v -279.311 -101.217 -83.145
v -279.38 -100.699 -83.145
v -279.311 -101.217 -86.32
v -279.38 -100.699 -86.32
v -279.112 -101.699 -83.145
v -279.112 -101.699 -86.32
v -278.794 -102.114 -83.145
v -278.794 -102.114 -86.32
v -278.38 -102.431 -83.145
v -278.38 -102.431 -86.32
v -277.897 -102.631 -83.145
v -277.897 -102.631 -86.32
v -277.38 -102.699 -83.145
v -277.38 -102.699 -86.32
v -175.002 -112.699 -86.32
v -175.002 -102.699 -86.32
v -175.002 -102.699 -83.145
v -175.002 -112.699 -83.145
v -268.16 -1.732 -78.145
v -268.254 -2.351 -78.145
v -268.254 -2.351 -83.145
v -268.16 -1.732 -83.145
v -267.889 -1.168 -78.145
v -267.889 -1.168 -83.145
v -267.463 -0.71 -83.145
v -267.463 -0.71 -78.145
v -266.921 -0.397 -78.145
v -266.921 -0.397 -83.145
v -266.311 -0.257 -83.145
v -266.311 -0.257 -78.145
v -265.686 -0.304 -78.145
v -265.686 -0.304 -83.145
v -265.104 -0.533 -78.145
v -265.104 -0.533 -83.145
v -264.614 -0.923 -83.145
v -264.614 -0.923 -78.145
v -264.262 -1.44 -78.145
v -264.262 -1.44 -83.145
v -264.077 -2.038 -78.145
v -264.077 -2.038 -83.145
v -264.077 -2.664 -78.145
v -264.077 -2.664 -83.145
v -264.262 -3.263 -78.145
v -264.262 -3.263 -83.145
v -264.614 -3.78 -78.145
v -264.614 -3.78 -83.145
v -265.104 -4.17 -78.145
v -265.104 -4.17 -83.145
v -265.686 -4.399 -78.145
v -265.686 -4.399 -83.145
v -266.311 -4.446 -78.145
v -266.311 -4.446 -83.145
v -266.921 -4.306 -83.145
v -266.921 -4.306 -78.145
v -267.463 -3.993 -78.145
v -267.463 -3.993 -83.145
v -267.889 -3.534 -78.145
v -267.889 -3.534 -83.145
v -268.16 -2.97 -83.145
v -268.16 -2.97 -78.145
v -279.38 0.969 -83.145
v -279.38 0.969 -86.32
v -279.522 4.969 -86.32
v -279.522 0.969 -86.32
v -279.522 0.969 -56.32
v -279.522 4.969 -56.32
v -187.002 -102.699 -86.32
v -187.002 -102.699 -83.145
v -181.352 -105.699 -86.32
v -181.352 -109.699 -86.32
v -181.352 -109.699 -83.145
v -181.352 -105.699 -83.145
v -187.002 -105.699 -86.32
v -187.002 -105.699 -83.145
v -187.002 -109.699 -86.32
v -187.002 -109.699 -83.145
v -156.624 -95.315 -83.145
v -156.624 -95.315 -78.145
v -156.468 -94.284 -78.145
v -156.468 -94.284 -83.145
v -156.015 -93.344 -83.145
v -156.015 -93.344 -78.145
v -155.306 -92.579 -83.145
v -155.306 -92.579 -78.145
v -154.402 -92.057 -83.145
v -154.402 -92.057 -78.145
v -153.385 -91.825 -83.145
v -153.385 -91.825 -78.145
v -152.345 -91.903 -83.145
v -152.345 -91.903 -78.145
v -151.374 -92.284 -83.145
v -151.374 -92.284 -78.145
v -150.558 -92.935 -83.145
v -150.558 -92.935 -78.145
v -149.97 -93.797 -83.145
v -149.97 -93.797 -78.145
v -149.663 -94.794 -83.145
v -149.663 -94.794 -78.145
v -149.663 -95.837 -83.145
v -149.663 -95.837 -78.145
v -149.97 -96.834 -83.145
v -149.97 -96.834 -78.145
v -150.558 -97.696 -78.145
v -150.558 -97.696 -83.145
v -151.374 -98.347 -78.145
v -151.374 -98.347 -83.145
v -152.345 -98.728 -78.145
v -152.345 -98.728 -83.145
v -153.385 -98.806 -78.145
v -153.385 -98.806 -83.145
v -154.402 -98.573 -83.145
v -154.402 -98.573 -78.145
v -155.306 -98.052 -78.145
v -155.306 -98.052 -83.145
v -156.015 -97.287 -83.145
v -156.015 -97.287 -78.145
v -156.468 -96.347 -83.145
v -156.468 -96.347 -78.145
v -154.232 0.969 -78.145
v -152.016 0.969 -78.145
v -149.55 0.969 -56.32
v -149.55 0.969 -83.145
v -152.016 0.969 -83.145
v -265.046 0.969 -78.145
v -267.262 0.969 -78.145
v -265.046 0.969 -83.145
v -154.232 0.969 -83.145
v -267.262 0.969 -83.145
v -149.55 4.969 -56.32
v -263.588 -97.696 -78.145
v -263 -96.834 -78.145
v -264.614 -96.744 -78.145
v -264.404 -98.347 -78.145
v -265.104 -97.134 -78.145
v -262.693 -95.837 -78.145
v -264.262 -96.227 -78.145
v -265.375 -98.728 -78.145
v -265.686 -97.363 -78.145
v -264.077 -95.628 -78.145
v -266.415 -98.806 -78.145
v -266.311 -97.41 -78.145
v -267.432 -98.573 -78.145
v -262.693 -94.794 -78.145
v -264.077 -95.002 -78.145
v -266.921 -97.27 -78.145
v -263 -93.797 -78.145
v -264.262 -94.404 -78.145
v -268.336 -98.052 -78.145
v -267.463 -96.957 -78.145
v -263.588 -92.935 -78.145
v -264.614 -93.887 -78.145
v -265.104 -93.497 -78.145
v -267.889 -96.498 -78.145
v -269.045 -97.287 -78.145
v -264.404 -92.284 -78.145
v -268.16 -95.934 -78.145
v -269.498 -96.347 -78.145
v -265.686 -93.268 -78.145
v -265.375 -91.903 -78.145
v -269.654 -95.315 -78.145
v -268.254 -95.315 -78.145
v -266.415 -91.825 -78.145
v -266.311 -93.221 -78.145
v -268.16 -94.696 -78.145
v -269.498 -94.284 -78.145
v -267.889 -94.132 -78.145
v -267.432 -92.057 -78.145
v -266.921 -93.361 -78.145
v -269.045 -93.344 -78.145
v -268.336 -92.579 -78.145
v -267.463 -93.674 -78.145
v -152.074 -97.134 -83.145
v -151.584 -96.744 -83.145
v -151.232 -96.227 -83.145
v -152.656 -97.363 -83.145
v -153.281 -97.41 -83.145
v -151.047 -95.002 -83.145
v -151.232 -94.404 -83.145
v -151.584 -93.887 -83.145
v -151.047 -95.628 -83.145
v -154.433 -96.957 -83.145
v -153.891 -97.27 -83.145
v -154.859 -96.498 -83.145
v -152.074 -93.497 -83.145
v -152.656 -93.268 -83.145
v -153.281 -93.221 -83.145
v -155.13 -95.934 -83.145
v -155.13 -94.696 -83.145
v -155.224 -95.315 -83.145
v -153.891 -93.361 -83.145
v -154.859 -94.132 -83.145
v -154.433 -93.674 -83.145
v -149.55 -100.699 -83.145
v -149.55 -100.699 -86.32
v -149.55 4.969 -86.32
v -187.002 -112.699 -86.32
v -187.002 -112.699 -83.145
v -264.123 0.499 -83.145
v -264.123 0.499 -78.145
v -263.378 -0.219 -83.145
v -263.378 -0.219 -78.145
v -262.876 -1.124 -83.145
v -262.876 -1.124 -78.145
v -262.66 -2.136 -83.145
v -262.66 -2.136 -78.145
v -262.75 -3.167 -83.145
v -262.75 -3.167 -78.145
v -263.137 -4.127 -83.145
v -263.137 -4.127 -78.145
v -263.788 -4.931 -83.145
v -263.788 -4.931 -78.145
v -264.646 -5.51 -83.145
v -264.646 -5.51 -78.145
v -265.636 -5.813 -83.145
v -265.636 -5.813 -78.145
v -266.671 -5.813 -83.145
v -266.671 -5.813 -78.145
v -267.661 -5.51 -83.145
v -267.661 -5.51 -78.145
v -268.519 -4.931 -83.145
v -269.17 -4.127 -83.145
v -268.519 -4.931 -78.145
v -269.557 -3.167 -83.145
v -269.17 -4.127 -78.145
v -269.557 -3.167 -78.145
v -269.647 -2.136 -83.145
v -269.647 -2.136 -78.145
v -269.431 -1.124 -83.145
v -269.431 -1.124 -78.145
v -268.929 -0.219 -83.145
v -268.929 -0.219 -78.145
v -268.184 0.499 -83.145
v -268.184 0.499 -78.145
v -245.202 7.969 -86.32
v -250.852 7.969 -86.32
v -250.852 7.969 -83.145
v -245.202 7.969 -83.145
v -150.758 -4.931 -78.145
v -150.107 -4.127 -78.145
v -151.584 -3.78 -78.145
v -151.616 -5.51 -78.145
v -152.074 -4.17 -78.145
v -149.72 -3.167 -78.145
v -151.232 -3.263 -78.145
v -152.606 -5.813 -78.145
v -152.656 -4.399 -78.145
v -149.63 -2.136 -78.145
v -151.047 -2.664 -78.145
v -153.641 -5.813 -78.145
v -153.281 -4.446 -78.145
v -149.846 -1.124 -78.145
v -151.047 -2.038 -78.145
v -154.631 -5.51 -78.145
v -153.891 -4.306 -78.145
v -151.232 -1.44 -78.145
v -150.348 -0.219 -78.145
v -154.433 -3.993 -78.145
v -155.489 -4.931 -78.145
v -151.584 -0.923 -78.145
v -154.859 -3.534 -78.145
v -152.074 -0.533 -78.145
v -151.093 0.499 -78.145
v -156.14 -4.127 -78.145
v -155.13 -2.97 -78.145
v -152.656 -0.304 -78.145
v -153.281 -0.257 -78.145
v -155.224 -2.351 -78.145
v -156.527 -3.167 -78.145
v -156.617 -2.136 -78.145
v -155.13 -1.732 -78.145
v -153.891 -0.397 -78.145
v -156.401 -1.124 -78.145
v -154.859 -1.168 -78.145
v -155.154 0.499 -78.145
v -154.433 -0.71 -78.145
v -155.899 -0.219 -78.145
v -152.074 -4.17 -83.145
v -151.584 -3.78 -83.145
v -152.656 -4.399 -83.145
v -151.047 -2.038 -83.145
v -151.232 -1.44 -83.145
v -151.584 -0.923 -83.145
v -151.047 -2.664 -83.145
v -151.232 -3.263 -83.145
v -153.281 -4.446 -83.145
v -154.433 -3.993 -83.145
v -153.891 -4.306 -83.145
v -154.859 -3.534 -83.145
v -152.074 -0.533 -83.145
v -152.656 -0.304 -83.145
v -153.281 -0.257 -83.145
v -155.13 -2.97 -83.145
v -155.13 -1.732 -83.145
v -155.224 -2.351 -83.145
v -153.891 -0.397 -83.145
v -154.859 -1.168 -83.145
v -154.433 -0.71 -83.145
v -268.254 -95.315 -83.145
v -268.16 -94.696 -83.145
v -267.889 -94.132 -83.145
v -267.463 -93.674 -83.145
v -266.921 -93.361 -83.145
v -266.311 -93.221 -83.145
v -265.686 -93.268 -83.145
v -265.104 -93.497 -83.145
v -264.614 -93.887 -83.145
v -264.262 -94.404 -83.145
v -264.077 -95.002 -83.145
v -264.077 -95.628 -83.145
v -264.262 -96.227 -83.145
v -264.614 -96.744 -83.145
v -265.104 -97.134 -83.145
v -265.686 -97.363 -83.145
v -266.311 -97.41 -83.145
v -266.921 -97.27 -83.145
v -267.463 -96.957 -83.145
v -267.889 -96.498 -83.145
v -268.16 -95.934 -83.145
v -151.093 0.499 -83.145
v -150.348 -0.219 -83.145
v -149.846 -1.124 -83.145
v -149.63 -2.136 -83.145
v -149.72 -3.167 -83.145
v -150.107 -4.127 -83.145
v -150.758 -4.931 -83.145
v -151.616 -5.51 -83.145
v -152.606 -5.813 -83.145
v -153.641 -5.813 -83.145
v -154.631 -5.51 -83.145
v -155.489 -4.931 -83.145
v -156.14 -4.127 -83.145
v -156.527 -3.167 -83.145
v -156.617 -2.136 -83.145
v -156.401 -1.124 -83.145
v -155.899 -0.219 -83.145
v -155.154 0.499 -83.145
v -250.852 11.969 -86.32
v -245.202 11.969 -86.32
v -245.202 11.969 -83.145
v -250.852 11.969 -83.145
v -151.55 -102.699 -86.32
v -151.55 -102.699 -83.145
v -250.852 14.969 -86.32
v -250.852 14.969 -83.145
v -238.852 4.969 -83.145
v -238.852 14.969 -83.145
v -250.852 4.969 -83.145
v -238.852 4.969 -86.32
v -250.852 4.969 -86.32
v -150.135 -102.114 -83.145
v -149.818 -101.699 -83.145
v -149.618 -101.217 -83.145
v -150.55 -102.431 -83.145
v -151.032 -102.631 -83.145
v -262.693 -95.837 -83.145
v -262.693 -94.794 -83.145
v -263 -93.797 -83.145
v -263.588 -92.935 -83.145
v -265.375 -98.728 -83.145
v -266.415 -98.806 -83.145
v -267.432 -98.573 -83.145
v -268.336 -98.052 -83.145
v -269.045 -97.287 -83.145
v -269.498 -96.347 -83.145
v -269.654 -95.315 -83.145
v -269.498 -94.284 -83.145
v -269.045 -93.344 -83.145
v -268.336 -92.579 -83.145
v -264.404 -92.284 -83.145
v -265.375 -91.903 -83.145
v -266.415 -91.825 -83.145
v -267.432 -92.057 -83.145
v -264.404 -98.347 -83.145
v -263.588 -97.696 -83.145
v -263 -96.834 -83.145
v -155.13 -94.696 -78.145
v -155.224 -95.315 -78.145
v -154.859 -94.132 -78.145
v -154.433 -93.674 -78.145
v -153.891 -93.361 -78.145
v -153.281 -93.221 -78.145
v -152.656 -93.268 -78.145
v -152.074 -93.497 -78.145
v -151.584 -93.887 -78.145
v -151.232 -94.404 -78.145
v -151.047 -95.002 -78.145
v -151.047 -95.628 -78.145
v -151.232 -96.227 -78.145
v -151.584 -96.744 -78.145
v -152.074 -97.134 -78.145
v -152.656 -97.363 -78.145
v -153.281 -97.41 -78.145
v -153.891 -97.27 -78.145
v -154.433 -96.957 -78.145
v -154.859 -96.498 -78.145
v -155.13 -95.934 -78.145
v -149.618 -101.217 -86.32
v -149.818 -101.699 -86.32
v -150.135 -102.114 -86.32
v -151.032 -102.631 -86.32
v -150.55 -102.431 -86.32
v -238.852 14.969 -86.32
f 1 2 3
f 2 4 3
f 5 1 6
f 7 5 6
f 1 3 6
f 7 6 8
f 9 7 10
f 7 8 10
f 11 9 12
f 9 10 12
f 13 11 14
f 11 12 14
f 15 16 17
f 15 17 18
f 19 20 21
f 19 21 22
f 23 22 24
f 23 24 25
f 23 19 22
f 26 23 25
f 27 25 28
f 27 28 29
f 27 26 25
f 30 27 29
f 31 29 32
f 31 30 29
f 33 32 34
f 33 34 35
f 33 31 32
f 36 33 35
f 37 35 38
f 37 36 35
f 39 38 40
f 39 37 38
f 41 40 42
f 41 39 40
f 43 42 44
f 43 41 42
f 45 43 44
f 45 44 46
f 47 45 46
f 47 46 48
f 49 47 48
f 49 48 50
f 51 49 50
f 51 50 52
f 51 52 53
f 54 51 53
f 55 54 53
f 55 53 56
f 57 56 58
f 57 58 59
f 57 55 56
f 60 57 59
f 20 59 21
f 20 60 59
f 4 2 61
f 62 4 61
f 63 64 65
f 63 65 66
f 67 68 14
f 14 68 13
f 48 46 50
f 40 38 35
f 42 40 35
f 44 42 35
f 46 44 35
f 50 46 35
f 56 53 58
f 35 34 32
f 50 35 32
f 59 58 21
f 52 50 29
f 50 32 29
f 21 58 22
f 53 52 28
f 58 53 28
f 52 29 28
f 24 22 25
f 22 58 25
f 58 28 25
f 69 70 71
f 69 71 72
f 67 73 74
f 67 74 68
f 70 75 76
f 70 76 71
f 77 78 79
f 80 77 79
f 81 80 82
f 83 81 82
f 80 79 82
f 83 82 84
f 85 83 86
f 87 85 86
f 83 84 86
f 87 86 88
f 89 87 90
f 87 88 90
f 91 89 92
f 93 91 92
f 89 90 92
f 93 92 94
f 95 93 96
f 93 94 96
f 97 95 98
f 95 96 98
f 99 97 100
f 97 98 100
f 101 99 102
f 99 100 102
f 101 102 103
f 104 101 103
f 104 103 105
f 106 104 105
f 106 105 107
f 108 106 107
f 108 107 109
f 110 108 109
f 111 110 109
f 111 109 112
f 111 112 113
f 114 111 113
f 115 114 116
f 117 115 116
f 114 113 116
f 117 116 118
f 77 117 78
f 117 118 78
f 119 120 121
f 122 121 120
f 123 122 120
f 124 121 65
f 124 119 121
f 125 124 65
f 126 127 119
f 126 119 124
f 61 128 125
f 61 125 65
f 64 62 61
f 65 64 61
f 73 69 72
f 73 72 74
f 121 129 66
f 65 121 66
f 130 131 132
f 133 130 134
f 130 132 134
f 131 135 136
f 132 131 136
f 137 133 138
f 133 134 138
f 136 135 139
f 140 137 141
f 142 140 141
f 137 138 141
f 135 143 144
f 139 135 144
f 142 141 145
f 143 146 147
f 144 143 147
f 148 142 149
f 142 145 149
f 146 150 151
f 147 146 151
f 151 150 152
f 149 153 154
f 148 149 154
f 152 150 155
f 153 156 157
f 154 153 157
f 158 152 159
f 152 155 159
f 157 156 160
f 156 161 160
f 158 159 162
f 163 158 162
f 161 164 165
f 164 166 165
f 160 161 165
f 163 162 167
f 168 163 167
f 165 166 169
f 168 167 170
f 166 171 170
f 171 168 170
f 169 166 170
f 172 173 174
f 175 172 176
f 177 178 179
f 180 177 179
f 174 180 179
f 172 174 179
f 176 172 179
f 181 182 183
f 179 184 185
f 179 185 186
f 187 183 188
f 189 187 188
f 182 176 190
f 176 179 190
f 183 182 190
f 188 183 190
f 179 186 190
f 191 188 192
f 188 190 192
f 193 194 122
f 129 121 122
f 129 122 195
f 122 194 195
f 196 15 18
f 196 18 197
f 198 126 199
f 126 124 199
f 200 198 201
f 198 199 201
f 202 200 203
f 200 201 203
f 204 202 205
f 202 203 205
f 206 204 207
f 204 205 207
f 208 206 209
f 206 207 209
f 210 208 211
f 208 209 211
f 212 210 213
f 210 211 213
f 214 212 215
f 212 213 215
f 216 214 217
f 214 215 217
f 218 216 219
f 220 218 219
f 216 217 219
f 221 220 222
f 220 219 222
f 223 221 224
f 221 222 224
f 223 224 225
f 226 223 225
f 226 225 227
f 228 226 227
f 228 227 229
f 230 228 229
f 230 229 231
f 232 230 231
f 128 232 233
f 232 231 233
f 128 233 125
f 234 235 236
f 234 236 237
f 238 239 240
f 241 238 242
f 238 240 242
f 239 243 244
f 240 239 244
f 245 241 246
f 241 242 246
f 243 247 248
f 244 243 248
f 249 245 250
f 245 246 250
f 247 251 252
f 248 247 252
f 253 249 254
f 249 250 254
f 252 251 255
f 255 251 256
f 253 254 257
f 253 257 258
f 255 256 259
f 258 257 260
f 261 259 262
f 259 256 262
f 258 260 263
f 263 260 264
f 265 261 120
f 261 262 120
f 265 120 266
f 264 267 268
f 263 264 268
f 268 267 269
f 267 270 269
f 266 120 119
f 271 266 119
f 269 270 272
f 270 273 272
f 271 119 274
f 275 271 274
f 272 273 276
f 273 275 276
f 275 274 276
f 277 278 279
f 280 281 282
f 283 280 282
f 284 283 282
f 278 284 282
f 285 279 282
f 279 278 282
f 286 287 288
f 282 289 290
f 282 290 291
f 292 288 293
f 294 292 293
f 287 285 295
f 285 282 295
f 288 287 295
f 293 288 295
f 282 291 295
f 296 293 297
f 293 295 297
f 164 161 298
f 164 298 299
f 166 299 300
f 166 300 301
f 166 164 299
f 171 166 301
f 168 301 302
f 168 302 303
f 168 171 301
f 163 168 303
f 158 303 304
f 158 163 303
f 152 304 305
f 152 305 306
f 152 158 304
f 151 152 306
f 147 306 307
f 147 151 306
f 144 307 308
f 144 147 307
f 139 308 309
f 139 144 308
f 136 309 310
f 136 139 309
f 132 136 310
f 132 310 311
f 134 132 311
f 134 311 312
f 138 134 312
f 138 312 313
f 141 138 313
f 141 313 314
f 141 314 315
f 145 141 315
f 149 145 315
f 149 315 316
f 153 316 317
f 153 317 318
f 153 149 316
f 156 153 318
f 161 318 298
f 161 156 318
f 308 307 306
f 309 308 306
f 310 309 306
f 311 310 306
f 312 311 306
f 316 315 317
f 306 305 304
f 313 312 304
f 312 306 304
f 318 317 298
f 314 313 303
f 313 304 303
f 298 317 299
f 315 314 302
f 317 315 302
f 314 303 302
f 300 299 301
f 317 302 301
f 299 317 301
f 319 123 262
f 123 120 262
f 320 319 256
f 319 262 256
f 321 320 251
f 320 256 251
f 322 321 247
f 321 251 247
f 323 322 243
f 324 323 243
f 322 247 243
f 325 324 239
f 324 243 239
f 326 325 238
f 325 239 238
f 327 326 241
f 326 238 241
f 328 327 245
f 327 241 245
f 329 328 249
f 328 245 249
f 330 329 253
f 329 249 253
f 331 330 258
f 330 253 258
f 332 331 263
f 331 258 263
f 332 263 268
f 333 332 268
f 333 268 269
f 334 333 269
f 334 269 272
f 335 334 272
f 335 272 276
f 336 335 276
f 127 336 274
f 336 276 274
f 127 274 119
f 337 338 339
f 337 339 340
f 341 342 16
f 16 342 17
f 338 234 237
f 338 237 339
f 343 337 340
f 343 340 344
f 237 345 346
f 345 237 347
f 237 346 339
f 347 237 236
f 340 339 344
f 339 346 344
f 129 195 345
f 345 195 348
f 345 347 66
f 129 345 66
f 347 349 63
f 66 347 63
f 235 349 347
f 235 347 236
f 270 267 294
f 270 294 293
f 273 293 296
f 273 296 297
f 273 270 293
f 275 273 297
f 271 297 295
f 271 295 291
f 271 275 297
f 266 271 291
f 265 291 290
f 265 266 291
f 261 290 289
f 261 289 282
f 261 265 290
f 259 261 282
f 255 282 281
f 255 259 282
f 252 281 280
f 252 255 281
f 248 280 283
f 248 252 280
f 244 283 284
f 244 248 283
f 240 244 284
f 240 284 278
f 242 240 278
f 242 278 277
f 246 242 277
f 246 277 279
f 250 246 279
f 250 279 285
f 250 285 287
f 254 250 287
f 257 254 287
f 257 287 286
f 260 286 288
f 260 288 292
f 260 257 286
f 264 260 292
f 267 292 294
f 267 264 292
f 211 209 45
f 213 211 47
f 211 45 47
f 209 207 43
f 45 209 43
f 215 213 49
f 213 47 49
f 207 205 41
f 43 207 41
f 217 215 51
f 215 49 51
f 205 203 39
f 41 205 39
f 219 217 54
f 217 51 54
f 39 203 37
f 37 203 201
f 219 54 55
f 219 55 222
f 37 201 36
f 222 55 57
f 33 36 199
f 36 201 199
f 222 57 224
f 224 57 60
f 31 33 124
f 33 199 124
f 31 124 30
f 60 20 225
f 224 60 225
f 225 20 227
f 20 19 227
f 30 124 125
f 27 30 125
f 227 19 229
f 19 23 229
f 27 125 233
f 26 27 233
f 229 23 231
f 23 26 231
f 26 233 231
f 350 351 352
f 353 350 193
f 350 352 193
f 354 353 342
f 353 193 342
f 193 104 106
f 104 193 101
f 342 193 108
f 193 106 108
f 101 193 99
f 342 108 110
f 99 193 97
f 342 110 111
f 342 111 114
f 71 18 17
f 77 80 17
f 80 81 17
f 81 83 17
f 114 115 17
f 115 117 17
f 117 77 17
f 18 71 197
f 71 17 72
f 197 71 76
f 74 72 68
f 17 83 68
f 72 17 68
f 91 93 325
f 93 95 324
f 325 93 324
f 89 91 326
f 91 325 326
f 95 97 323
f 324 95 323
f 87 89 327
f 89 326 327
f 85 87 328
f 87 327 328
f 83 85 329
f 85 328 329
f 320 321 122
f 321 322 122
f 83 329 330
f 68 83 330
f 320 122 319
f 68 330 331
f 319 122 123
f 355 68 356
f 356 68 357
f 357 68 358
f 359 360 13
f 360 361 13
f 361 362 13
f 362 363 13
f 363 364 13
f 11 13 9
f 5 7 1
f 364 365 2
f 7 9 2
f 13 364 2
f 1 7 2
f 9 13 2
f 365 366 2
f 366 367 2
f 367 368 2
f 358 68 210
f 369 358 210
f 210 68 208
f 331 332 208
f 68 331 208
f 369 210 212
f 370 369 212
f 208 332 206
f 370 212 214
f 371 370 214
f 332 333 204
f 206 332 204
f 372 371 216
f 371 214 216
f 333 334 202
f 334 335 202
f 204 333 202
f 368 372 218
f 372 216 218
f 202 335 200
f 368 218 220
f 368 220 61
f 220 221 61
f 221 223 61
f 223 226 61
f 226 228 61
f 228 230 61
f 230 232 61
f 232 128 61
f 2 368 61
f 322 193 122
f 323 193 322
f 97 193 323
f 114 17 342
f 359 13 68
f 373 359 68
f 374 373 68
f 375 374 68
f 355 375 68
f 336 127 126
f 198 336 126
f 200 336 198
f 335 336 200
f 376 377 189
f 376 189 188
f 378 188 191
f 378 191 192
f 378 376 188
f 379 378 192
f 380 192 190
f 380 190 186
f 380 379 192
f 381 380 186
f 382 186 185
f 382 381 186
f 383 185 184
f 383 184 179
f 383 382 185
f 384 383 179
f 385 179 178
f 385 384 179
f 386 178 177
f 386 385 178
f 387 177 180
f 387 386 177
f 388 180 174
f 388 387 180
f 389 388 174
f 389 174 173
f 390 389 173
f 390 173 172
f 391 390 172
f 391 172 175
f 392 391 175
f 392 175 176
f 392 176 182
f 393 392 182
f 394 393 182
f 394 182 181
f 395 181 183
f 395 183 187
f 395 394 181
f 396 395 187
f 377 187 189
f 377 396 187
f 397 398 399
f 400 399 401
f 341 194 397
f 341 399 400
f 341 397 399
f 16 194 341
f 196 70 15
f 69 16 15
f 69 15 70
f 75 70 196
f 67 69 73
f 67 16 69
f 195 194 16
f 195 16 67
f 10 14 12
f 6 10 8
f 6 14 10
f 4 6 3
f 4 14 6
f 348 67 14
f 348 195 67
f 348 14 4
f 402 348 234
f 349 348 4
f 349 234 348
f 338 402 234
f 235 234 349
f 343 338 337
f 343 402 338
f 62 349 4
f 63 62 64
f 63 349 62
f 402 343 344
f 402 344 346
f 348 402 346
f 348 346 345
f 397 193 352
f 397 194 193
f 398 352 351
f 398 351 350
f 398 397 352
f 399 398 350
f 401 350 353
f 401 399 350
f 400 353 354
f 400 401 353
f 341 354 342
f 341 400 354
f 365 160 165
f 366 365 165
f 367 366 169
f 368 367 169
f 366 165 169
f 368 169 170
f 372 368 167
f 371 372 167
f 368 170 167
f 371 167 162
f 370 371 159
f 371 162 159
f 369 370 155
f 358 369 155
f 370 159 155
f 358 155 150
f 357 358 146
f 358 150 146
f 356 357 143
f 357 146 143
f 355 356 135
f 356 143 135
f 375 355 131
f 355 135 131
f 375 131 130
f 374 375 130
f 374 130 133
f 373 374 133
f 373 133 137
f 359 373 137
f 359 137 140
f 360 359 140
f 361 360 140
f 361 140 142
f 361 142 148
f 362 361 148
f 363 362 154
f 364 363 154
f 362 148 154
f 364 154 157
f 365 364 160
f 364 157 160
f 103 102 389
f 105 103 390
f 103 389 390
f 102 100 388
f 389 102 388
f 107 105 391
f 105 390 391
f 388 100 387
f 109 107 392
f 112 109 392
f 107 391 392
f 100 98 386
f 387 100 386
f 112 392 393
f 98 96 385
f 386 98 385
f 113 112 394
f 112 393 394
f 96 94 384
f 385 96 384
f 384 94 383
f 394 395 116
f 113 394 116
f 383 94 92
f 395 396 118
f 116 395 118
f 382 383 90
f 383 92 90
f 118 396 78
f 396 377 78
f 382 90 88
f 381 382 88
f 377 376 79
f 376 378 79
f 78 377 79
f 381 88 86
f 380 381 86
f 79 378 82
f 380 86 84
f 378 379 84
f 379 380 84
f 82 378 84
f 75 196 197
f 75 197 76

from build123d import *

# Parameters (mm, degrees)
SKETCH1_R             = 3.5
SKETCH1_R_2           = 2.1
BOSS_EXTRUDE1_DEPTH   = 5
BOSS_EXTRUDE1_2_DEPTH = 5
BOSS_EXTRUDE1_3_DEPTH = 5
BOSS_EXTRUDE1_4_DEPTH = 5
SKETCH2_W             = 129.83
SKETCH2_H             = 103.668
BOSS_EXTRUDE2_DEPTH   = 3.175
SKETCH3_W             = 129.972581898
SKETCH3_H             = 4
BOSS_EXTRUDE3_DEPTH   = 30
FILLET1_R             = 2
BOSS_EXTRUDE4_DEPTH   = 3.175


with BuildPart() as part:
    # Sketch1 → Boss-Extrude1 (new body)
    with BuildSketch(Plane(origin=(0, 0, -78.144797939), x_dir=(-1, 0, 0), z_dir=(0, 0, -1))):
        with Locations((153.123589598, -2.351422522)):
            Circle(SKETCH1_R)
        with Locations((153.123589598, -2.351422522)):
            Circle(SKETCH1_R_2, mode=Mode.SUBTRACT)
    extrude(amount=BOSS_EXTRUDE1_DEPTH)



with BuildPart() as body_2:
    # Sketch1 → Boss-Extrude1 2 (new body)
    with BuildSketch(Plane(origin=(0, 0, -78.144797939), x_dir=(-1, 0, 0), z_dir=(0, 0, -1))):
        with Locations((266.153589598, -2.351422522)):
            Circle(SKETCH1_R)
        with Locations((266.153589598, -2.351422522)):
            Circle(SKETCH1_R_2, mode=Mode.SUBTRACT)
    extrude(amount=BOSS_EXTRUDE1_2_DEPTH)


with BuildPart() as body_3:
    # Sketch1 → Boss-Extrude1 3 (new body)
    with BuildSketch(Plane(origin=(0, 0, -78.144797939), x_dir=(-1, 0, 0), z_dir=(0, 0, -1))):
        with Locations((153.123589598, -95.315422522)):
            Circle(SKETCH1_R)
        with Locations((153.123589598, -95.315422522)):
            Circle(SKETCH1_R_2, mode=Mode.SUBTRACT)
    extrude(amount=BOSS_EXTRUDE1_3_DEPTH)


with BuildPart() as body_4:
    # Sketch1 → Boss-Extrude1 4 (new body)
    with BuildSketch(Plane(origin=(0, 0, -78.144797939), x_dir=(-1, 0, 0), z_dir=(0, 0, -1))):
        with Locations((266.153589598, -95.315422522)):
            Circle(SKETCH1_R)
        with Locations((266.153589598, -95.315422522)):
            Circle(SKETCH1_R_2, mode=Mode.SUBTRACT)
    extrude(amount=BOSS_EXTRUDE1_4_DEPTH)


with BuildPart() as part_1:
    add(part.part)

    add(body_2.part)  # Boss-Extrude2 merges body 2

    add(body_3.part)  # Boss-Extrude2 merges body 3

    add(body_4.part)  # Boss-Extrude2 merges body 4
    # Sketch2 → Boss-Extrude2 (add)
    with BuildSketch(Plane(origin=(0, 0, -83.144797939), x_dir=(-1, 0, 0), z_dir=(0, 0, -1))):
        with Locations((214.464589598, -50.865422522)):
            Rectangle(SKETCH2_W, SKETCH2_H)
    extrude(amount=BOSS_EXTRUDE2_DEPTH)

    # Sketch3 → Boss-Extrude3 (add)
    with BuildSketch(Plane(origin=(0, 0, -86.319797939), x_dir=(-1, 0, 0), z_dir=(0, 0, -1))):
        with Locations((214.535880547, 2.968577478)):
            Rectangle(SKETCH3_W, SKETCH3_H)
    extrude(amount=-BOSS_EXTRUDE3_DEPTH)

    # Fillet1
    fillet1_edges = [part_1.edges().sort_by_distance(p)[0] for p in [
        (-279.379589598, -102.699422522, -84.732297939),
        (-149.549589598, -102.699422522, -84.732297939),
    ]]
    fillet(fillet1_edges, radius=FILLET1_R)

    # Sketch4 → Boss-Extrude4 (add)
    with BuildSketch(Plane(origin=(0, 0, -86.319797939), x_dir=(-1, 0, 0), z_dir=(0, 0, -1))):
        Polygon((238.851684859, 14.968577478), (238.851684859, 4.968577478), (250.851684859, 4.968577478), (250.851684859, 7.968577478), (245.201684859, 7.968577478), (245.201684859, 11.968577478), (250.851684859, 11.968577478), (250.851684859, 14.968577478), align=None)
        Polygon((187.002486437, -102.699422522), (175.002486437, -102.699422522), (175.002486437, -112.699422522), (187.002486437, -112.699422522), (187.002486437, -109.699422522), (181.352486437, -109.699422522), (181.352486437, -105.699422522), (187.002486437, -105.699422522), align=None)
    extrude(amount=-BOSS_EXTRUDE4_DEPTH)


solid = part_1.part
